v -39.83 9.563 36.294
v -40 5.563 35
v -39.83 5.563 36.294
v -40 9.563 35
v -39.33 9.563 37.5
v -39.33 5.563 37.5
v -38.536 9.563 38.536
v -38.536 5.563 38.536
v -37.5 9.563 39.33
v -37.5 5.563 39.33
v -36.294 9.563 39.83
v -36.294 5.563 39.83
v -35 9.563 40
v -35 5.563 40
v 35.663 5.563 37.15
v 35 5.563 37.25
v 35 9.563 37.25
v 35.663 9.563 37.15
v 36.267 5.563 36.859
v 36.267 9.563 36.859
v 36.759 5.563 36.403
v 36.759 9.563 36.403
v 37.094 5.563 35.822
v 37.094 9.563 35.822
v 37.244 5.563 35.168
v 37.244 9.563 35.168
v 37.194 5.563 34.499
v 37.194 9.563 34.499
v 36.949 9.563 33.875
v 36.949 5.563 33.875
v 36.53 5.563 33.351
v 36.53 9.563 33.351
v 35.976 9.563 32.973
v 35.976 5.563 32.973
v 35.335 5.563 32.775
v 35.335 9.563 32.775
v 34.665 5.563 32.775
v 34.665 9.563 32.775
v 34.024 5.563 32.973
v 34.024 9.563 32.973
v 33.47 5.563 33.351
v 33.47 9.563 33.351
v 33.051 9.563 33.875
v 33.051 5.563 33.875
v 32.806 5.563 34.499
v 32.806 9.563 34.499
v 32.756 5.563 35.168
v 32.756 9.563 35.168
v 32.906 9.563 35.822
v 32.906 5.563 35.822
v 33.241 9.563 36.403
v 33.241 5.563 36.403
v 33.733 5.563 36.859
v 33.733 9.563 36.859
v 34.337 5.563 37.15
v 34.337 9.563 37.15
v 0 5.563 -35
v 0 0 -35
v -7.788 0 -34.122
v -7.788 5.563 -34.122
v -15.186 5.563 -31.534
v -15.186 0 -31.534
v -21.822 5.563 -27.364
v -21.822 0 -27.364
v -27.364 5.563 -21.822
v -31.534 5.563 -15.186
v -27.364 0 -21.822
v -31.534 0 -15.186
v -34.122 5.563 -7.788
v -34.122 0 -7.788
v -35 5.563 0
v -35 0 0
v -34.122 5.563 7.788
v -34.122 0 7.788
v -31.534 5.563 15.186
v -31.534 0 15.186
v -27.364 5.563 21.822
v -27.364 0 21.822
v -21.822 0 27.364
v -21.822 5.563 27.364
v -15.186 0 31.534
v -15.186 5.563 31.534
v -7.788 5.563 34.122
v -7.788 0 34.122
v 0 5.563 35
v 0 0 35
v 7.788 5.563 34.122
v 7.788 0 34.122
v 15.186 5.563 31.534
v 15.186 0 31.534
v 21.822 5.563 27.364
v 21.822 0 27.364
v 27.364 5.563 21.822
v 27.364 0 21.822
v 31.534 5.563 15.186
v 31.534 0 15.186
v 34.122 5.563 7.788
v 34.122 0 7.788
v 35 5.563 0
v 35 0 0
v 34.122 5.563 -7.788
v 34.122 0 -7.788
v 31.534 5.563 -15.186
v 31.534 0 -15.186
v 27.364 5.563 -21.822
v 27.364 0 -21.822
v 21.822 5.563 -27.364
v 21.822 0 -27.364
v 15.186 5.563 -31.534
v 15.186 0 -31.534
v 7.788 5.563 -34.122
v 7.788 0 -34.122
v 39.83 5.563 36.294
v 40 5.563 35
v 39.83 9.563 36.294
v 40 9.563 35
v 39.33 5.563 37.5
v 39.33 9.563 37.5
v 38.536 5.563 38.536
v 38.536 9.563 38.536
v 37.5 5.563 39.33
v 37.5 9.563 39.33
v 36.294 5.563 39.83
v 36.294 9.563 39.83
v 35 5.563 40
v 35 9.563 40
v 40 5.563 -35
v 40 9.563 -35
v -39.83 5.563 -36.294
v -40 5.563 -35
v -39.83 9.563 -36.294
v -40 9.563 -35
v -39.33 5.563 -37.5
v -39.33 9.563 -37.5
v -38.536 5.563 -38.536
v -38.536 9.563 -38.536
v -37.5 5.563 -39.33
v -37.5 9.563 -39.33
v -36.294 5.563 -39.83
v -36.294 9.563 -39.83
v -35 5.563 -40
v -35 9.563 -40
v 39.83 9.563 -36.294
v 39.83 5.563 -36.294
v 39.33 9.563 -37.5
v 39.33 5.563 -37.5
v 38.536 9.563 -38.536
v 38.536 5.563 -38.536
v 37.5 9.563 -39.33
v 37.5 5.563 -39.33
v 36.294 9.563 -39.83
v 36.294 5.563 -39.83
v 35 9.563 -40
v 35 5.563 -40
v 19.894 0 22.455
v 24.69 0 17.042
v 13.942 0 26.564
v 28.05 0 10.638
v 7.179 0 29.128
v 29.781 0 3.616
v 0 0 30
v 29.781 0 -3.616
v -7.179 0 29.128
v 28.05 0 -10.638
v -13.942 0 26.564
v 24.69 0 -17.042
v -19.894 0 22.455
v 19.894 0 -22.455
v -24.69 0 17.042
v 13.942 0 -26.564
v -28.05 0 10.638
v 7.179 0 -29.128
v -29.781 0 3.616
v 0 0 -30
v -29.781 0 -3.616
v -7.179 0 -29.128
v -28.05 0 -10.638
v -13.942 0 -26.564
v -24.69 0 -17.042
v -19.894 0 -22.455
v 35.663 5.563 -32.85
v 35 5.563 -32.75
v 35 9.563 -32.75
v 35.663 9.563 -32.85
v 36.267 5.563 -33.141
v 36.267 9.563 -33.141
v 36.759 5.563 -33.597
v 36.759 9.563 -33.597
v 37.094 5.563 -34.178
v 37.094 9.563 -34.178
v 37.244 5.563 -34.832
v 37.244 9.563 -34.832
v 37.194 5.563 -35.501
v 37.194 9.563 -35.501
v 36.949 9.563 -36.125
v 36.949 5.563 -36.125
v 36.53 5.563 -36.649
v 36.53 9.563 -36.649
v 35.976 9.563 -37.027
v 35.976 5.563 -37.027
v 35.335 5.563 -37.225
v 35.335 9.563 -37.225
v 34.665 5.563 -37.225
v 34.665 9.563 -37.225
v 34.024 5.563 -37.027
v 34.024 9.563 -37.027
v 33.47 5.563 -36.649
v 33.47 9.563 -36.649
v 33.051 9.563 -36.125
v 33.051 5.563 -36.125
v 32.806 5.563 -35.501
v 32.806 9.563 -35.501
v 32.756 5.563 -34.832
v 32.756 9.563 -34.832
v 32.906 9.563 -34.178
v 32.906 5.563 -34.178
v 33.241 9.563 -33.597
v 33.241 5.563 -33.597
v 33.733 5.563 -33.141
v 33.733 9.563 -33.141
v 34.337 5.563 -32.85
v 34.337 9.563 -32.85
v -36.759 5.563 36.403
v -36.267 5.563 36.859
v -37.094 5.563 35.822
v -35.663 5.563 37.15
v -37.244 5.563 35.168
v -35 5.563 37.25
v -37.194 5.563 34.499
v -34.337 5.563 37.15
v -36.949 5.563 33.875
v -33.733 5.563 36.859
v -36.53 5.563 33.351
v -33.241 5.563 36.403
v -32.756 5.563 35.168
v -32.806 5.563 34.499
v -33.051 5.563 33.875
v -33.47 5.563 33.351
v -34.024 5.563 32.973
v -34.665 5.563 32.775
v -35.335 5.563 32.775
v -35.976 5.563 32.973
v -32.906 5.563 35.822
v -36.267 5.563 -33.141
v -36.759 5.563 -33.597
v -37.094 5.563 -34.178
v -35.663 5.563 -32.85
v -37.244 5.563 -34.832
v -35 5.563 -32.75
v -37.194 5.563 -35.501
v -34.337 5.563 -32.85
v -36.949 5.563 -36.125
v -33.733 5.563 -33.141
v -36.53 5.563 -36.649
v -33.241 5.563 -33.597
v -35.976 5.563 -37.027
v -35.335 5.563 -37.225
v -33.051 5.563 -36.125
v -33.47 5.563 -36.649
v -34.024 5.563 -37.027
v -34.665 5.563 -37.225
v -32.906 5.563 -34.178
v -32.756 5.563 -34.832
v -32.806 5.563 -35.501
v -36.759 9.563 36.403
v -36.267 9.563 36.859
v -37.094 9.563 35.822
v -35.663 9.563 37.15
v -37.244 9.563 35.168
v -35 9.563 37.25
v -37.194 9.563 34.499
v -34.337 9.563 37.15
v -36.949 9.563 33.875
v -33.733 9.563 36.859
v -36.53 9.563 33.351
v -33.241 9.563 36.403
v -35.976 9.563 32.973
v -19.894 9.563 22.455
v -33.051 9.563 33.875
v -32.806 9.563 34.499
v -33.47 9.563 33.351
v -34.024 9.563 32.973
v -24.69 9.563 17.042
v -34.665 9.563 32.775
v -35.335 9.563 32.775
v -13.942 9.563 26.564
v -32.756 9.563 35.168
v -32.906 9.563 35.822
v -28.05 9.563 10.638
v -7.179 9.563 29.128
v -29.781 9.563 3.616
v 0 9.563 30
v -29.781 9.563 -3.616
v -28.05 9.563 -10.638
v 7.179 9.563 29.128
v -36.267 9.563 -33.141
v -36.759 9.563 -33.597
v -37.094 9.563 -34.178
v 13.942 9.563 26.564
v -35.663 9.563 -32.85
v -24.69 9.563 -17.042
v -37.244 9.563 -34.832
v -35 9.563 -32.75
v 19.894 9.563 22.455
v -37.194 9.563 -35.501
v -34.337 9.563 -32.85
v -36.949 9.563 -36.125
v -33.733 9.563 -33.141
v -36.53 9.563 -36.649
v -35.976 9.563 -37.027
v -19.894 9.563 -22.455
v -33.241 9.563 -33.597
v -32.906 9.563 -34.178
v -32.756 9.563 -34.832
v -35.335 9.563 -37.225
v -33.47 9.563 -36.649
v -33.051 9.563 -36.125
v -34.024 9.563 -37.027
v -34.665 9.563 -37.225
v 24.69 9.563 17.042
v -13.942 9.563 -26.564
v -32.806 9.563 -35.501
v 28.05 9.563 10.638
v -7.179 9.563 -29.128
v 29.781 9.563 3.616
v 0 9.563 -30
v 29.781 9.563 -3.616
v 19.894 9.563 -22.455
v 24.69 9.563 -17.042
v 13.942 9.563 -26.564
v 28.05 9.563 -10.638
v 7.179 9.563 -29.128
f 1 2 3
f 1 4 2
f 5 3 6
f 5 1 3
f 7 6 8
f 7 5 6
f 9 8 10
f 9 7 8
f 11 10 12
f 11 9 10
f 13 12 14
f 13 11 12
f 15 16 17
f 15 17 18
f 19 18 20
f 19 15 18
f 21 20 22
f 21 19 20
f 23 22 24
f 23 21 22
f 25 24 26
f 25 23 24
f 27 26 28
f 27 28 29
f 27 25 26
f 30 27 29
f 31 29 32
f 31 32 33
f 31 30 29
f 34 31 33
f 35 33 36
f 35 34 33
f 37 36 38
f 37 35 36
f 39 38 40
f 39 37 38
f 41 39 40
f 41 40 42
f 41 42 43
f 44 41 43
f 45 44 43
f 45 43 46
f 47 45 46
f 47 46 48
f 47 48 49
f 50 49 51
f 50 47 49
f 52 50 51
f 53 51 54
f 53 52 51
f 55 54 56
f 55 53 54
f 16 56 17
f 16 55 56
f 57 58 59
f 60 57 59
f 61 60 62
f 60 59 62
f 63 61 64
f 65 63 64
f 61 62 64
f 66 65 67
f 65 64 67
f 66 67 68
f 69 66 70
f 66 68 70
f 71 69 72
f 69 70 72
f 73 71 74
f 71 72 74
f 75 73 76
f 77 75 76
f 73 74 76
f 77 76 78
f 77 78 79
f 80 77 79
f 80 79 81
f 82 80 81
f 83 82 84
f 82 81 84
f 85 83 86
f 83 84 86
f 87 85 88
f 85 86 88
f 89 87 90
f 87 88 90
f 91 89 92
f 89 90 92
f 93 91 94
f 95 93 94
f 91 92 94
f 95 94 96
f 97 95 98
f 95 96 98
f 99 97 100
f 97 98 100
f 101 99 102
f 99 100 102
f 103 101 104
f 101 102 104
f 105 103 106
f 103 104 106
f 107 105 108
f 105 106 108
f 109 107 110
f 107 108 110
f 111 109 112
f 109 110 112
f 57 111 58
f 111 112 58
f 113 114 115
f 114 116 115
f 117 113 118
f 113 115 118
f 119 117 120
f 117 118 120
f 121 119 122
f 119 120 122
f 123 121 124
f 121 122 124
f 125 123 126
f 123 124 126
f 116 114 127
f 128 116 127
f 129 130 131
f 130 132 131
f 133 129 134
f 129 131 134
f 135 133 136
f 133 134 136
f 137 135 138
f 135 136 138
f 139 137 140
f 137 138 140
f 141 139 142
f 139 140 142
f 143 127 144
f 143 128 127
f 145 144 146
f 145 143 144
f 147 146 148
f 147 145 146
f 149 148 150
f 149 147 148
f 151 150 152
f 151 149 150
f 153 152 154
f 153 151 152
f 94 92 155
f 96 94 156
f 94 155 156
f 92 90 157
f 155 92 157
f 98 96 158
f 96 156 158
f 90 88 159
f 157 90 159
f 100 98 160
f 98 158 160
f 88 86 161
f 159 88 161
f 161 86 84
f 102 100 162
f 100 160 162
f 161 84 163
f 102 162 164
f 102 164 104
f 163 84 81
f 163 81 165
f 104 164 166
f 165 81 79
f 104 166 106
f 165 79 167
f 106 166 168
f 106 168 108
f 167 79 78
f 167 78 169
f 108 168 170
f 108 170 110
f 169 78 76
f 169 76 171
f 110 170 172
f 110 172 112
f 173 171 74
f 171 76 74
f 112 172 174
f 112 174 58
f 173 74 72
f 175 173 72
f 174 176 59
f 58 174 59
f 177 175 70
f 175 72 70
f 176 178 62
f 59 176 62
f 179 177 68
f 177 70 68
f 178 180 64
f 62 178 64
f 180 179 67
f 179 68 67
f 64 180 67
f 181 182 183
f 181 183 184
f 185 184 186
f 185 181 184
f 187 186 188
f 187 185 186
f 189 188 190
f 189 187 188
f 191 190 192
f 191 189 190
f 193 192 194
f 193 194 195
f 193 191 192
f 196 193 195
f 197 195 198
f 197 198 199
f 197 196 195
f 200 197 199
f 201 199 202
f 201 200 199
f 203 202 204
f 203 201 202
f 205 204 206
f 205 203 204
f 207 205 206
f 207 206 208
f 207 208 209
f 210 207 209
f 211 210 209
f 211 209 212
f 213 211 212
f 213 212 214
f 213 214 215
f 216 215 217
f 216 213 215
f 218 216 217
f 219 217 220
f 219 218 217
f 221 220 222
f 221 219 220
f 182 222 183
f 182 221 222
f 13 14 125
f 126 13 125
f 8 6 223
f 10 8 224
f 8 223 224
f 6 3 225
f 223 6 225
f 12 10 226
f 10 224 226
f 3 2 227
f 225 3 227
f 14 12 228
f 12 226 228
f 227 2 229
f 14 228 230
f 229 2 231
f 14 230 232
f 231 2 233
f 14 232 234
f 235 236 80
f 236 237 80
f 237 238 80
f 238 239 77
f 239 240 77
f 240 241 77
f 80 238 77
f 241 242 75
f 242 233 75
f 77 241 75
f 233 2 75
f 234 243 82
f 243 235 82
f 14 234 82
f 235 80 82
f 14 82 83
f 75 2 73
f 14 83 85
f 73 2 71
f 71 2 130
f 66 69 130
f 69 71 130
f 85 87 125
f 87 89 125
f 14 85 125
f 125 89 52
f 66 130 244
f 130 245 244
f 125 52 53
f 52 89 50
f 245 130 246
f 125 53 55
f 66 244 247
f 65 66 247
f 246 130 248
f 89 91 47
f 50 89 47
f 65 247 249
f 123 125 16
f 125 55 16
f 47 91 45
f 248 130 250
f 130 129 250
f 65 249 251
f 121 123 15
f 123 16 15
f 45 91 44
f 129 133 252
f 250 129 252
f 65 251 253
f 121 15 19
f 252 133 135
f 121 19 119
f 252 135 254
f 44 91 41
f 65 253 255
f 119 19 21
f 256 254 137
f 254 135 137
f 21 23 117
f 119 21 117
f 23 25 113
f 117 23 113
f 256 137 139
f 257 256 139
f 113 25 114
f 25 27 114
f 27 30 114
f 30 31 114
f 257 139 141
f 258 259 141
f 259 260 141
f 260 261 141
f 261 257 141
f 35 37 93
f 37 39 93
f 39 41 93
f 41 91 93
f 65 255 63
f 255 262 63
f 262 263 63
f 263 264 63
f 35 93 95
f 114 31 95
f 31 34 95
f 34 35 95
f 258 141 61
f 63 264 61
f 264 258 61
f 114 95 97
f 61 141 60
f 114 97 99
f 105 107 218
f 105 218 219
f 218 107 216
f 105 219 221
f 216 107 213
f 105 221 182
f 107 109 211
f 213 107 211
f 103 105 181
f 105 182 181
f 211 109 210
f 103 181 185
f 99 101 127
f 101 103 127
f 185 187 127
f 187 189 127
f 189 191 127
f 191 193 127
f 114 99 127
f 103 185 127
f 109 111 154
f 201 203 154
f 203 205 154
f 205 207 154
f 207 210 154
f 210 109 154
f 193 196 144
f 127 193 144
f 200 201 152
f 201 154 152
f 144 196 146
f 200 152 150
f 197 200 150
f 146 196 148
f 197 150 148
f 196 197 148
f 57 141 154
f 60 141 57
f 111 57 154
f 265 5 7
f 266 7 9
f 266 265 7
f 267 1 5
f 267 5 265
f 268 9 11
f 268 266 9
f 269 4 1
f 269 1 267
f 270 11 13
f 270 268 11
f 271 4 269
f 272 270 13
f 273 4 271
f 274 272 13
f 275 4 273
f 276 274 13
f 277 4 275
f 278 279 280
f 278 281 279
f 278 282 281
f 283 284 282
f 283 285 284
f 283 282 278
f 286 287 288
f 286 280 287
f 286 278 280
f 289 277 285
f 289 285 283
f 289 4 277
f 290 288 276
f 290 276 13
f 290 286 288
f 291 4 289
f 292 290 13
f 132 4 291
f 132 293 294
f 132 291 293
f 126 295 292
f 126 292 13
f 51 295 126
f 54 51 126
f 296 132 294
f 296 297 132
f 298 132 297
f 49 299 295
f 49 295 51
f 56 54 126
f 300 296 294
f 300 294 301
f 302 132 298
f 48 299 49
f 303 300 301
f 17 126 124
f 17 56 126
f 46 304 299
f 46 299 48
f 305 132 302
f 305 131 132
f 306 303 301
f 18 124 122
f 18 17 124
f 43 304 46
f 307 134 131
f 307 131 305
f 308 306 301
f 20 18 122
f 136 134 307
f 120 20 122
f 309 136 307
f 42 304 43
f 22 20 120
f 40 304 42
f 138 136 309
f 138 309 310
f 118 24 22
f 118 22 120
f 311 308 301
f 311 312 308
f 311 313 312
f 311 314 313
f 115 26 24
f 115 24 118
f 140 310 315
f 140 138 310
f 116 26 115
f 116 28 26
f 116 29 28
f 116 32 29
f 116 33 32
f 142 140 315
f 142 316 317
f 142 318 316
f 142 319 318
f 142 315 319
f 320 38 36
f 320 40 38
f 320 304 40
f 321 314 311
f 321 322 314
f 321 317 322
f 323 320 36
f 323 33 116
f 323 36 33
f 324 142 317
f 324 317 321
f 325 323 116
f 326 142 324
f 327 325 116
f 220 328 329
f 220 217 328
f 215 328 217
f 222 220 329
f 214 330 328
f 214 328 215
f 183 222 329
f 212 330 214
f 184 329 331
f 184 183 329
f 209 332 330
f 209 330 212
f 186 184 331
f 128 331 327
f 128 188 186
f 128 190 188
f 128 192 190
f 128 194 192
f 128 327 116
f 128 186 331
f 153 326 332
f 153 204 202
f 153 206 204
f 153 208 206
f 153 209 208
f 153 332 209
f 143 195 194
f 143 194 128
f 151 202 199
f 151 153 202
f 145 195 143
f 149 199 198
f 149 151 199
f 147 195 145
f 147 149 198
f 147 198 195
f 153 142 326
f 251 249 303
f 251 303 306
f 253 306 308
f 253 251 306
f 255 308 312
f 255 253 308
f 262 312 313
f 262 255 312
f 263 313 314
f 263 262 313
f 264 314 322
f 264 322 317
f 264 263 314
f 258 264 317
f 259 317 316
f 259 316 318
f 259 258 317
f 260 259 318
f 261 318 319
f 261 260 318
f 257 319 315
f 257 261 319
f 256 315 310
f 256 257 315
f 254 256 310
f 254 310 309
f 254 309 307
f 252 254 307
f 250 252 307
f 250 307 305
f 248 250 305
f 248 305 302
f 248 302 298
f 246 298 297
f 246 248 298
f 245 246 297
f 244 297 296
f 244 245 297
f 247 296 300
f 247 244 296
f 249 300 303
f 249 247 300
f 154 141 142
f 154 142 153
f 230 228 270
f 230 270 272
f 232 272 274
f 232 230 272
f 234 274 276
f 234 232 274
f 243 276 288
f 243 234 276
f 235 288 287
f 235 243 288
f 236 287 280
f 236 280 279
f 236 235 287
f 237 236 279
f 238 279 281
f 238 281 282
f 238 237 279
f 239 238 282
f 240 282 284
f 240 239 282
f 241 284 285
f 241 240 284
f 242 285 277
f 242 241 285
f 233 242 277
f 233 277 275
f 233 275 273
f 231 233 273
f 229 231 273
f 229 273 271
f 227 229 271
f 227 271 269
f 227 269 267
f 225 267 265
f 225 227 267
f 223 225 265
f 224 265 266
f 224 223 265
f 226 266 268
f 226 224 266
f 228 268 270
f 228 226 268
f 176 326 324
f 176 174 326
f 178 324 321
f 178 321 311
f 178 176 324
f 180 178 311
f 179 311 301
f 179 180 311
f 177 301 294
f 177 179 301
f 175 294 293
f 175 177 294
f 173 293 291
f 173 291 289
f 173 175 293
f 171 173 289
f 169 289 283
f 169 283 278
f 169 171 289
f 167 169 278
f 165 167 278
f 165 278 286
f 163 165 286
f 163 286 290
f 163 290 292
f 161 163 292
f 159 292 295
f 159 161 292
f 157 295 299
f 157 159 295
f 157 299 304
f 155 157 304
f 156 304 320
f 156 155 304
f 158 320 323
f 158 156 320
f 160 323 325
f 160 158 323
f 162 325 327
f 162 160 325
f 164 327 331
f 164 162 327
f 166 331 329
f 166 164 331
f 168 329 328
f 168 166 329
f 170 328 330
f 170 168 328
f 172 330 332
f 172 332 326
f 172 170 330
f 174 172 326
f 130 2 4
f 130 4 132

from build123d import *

# Parameters (mm, degrees)
SKETCH1_R           = 35
SKETCH1_R_2         = 30
BOSS_EXTRUDE1_DEPTH = 5.5626
SKETCH2_W           = 80
SKETCH2_H           = 80
SKETCH2_R           = 2.25
SKETCH2_R_2         = 30
BOSS_EXTRUDE3_DEPTH = 4
FILLET1_R           = 5


with BuildPart() as part:
    # Sketch1 → Boss-Extrude1 (new body)
    with BuildSketch(Plane(origin=(0, 0, 0), x_dir=(1, 0, 0), z_dir=(0, 1, 0))):
        with Locations(Location((0, 0, 0), (0, 0, 90))):
            Circle(SKETCH1_R)
        with Locations(Location((0, 0, 0), (0, 0, 90))):
            Circle(SKETCH1_R_2, mode=Mode.SUBTRACT)
    extrude(amount=BOSS_EXTRUDE1_DEPTH)

    # Sketch2 → Boss-Extrude3 (add)
    with BuildSketch(Plane(origin=(0, 5.5626, 0), x_dir=(1, 0, 0), z_dir=(0, 1, 0))):
        Rectangle(SKETCH2_W, SKETCH2_H)
        with Locations(Location((-35, -35, 0), (0, 0, 270))):
            Circle(SKETCH2_R, mode=Mode.SUBTRACT)
        with Locations(Location((-35, 35, 0), (0, 0, 270))):
            Circle(SKETCH2_R, mode=Mode.SUBTRACT)
        with Locations(Location((35, 35, 0), (0, 0, 270))):
            Circle(SKETCH2_R, mode=Mode.SUBTRACT)
        with Locations(Location((35, -35, 0), (0, 0, 270))):
            Circle(SKETCH2_R, mode=Mode.SUBTRACT)
        with Locations(Location((0, 0, 0), (0, 0, 90))):
            Circle(SKETCH2_R_2, mode=Mode.SUBTRACT)
    extrude(amount=BOSS_EXTRUDE3_DEPTH)

    # Fillet1
    fillet1_edges = [part.edges().sort_by_distance(p)[0] for p in [
        (-40, 7.5626, -40),
        (-40, 7.5626, 40),
        (40, 7.5626, 40),
        (40, 7.5626, -40),
    ]]
    fillet(fillet1_edges, radius=FILLET1_R)


solid = part.part
